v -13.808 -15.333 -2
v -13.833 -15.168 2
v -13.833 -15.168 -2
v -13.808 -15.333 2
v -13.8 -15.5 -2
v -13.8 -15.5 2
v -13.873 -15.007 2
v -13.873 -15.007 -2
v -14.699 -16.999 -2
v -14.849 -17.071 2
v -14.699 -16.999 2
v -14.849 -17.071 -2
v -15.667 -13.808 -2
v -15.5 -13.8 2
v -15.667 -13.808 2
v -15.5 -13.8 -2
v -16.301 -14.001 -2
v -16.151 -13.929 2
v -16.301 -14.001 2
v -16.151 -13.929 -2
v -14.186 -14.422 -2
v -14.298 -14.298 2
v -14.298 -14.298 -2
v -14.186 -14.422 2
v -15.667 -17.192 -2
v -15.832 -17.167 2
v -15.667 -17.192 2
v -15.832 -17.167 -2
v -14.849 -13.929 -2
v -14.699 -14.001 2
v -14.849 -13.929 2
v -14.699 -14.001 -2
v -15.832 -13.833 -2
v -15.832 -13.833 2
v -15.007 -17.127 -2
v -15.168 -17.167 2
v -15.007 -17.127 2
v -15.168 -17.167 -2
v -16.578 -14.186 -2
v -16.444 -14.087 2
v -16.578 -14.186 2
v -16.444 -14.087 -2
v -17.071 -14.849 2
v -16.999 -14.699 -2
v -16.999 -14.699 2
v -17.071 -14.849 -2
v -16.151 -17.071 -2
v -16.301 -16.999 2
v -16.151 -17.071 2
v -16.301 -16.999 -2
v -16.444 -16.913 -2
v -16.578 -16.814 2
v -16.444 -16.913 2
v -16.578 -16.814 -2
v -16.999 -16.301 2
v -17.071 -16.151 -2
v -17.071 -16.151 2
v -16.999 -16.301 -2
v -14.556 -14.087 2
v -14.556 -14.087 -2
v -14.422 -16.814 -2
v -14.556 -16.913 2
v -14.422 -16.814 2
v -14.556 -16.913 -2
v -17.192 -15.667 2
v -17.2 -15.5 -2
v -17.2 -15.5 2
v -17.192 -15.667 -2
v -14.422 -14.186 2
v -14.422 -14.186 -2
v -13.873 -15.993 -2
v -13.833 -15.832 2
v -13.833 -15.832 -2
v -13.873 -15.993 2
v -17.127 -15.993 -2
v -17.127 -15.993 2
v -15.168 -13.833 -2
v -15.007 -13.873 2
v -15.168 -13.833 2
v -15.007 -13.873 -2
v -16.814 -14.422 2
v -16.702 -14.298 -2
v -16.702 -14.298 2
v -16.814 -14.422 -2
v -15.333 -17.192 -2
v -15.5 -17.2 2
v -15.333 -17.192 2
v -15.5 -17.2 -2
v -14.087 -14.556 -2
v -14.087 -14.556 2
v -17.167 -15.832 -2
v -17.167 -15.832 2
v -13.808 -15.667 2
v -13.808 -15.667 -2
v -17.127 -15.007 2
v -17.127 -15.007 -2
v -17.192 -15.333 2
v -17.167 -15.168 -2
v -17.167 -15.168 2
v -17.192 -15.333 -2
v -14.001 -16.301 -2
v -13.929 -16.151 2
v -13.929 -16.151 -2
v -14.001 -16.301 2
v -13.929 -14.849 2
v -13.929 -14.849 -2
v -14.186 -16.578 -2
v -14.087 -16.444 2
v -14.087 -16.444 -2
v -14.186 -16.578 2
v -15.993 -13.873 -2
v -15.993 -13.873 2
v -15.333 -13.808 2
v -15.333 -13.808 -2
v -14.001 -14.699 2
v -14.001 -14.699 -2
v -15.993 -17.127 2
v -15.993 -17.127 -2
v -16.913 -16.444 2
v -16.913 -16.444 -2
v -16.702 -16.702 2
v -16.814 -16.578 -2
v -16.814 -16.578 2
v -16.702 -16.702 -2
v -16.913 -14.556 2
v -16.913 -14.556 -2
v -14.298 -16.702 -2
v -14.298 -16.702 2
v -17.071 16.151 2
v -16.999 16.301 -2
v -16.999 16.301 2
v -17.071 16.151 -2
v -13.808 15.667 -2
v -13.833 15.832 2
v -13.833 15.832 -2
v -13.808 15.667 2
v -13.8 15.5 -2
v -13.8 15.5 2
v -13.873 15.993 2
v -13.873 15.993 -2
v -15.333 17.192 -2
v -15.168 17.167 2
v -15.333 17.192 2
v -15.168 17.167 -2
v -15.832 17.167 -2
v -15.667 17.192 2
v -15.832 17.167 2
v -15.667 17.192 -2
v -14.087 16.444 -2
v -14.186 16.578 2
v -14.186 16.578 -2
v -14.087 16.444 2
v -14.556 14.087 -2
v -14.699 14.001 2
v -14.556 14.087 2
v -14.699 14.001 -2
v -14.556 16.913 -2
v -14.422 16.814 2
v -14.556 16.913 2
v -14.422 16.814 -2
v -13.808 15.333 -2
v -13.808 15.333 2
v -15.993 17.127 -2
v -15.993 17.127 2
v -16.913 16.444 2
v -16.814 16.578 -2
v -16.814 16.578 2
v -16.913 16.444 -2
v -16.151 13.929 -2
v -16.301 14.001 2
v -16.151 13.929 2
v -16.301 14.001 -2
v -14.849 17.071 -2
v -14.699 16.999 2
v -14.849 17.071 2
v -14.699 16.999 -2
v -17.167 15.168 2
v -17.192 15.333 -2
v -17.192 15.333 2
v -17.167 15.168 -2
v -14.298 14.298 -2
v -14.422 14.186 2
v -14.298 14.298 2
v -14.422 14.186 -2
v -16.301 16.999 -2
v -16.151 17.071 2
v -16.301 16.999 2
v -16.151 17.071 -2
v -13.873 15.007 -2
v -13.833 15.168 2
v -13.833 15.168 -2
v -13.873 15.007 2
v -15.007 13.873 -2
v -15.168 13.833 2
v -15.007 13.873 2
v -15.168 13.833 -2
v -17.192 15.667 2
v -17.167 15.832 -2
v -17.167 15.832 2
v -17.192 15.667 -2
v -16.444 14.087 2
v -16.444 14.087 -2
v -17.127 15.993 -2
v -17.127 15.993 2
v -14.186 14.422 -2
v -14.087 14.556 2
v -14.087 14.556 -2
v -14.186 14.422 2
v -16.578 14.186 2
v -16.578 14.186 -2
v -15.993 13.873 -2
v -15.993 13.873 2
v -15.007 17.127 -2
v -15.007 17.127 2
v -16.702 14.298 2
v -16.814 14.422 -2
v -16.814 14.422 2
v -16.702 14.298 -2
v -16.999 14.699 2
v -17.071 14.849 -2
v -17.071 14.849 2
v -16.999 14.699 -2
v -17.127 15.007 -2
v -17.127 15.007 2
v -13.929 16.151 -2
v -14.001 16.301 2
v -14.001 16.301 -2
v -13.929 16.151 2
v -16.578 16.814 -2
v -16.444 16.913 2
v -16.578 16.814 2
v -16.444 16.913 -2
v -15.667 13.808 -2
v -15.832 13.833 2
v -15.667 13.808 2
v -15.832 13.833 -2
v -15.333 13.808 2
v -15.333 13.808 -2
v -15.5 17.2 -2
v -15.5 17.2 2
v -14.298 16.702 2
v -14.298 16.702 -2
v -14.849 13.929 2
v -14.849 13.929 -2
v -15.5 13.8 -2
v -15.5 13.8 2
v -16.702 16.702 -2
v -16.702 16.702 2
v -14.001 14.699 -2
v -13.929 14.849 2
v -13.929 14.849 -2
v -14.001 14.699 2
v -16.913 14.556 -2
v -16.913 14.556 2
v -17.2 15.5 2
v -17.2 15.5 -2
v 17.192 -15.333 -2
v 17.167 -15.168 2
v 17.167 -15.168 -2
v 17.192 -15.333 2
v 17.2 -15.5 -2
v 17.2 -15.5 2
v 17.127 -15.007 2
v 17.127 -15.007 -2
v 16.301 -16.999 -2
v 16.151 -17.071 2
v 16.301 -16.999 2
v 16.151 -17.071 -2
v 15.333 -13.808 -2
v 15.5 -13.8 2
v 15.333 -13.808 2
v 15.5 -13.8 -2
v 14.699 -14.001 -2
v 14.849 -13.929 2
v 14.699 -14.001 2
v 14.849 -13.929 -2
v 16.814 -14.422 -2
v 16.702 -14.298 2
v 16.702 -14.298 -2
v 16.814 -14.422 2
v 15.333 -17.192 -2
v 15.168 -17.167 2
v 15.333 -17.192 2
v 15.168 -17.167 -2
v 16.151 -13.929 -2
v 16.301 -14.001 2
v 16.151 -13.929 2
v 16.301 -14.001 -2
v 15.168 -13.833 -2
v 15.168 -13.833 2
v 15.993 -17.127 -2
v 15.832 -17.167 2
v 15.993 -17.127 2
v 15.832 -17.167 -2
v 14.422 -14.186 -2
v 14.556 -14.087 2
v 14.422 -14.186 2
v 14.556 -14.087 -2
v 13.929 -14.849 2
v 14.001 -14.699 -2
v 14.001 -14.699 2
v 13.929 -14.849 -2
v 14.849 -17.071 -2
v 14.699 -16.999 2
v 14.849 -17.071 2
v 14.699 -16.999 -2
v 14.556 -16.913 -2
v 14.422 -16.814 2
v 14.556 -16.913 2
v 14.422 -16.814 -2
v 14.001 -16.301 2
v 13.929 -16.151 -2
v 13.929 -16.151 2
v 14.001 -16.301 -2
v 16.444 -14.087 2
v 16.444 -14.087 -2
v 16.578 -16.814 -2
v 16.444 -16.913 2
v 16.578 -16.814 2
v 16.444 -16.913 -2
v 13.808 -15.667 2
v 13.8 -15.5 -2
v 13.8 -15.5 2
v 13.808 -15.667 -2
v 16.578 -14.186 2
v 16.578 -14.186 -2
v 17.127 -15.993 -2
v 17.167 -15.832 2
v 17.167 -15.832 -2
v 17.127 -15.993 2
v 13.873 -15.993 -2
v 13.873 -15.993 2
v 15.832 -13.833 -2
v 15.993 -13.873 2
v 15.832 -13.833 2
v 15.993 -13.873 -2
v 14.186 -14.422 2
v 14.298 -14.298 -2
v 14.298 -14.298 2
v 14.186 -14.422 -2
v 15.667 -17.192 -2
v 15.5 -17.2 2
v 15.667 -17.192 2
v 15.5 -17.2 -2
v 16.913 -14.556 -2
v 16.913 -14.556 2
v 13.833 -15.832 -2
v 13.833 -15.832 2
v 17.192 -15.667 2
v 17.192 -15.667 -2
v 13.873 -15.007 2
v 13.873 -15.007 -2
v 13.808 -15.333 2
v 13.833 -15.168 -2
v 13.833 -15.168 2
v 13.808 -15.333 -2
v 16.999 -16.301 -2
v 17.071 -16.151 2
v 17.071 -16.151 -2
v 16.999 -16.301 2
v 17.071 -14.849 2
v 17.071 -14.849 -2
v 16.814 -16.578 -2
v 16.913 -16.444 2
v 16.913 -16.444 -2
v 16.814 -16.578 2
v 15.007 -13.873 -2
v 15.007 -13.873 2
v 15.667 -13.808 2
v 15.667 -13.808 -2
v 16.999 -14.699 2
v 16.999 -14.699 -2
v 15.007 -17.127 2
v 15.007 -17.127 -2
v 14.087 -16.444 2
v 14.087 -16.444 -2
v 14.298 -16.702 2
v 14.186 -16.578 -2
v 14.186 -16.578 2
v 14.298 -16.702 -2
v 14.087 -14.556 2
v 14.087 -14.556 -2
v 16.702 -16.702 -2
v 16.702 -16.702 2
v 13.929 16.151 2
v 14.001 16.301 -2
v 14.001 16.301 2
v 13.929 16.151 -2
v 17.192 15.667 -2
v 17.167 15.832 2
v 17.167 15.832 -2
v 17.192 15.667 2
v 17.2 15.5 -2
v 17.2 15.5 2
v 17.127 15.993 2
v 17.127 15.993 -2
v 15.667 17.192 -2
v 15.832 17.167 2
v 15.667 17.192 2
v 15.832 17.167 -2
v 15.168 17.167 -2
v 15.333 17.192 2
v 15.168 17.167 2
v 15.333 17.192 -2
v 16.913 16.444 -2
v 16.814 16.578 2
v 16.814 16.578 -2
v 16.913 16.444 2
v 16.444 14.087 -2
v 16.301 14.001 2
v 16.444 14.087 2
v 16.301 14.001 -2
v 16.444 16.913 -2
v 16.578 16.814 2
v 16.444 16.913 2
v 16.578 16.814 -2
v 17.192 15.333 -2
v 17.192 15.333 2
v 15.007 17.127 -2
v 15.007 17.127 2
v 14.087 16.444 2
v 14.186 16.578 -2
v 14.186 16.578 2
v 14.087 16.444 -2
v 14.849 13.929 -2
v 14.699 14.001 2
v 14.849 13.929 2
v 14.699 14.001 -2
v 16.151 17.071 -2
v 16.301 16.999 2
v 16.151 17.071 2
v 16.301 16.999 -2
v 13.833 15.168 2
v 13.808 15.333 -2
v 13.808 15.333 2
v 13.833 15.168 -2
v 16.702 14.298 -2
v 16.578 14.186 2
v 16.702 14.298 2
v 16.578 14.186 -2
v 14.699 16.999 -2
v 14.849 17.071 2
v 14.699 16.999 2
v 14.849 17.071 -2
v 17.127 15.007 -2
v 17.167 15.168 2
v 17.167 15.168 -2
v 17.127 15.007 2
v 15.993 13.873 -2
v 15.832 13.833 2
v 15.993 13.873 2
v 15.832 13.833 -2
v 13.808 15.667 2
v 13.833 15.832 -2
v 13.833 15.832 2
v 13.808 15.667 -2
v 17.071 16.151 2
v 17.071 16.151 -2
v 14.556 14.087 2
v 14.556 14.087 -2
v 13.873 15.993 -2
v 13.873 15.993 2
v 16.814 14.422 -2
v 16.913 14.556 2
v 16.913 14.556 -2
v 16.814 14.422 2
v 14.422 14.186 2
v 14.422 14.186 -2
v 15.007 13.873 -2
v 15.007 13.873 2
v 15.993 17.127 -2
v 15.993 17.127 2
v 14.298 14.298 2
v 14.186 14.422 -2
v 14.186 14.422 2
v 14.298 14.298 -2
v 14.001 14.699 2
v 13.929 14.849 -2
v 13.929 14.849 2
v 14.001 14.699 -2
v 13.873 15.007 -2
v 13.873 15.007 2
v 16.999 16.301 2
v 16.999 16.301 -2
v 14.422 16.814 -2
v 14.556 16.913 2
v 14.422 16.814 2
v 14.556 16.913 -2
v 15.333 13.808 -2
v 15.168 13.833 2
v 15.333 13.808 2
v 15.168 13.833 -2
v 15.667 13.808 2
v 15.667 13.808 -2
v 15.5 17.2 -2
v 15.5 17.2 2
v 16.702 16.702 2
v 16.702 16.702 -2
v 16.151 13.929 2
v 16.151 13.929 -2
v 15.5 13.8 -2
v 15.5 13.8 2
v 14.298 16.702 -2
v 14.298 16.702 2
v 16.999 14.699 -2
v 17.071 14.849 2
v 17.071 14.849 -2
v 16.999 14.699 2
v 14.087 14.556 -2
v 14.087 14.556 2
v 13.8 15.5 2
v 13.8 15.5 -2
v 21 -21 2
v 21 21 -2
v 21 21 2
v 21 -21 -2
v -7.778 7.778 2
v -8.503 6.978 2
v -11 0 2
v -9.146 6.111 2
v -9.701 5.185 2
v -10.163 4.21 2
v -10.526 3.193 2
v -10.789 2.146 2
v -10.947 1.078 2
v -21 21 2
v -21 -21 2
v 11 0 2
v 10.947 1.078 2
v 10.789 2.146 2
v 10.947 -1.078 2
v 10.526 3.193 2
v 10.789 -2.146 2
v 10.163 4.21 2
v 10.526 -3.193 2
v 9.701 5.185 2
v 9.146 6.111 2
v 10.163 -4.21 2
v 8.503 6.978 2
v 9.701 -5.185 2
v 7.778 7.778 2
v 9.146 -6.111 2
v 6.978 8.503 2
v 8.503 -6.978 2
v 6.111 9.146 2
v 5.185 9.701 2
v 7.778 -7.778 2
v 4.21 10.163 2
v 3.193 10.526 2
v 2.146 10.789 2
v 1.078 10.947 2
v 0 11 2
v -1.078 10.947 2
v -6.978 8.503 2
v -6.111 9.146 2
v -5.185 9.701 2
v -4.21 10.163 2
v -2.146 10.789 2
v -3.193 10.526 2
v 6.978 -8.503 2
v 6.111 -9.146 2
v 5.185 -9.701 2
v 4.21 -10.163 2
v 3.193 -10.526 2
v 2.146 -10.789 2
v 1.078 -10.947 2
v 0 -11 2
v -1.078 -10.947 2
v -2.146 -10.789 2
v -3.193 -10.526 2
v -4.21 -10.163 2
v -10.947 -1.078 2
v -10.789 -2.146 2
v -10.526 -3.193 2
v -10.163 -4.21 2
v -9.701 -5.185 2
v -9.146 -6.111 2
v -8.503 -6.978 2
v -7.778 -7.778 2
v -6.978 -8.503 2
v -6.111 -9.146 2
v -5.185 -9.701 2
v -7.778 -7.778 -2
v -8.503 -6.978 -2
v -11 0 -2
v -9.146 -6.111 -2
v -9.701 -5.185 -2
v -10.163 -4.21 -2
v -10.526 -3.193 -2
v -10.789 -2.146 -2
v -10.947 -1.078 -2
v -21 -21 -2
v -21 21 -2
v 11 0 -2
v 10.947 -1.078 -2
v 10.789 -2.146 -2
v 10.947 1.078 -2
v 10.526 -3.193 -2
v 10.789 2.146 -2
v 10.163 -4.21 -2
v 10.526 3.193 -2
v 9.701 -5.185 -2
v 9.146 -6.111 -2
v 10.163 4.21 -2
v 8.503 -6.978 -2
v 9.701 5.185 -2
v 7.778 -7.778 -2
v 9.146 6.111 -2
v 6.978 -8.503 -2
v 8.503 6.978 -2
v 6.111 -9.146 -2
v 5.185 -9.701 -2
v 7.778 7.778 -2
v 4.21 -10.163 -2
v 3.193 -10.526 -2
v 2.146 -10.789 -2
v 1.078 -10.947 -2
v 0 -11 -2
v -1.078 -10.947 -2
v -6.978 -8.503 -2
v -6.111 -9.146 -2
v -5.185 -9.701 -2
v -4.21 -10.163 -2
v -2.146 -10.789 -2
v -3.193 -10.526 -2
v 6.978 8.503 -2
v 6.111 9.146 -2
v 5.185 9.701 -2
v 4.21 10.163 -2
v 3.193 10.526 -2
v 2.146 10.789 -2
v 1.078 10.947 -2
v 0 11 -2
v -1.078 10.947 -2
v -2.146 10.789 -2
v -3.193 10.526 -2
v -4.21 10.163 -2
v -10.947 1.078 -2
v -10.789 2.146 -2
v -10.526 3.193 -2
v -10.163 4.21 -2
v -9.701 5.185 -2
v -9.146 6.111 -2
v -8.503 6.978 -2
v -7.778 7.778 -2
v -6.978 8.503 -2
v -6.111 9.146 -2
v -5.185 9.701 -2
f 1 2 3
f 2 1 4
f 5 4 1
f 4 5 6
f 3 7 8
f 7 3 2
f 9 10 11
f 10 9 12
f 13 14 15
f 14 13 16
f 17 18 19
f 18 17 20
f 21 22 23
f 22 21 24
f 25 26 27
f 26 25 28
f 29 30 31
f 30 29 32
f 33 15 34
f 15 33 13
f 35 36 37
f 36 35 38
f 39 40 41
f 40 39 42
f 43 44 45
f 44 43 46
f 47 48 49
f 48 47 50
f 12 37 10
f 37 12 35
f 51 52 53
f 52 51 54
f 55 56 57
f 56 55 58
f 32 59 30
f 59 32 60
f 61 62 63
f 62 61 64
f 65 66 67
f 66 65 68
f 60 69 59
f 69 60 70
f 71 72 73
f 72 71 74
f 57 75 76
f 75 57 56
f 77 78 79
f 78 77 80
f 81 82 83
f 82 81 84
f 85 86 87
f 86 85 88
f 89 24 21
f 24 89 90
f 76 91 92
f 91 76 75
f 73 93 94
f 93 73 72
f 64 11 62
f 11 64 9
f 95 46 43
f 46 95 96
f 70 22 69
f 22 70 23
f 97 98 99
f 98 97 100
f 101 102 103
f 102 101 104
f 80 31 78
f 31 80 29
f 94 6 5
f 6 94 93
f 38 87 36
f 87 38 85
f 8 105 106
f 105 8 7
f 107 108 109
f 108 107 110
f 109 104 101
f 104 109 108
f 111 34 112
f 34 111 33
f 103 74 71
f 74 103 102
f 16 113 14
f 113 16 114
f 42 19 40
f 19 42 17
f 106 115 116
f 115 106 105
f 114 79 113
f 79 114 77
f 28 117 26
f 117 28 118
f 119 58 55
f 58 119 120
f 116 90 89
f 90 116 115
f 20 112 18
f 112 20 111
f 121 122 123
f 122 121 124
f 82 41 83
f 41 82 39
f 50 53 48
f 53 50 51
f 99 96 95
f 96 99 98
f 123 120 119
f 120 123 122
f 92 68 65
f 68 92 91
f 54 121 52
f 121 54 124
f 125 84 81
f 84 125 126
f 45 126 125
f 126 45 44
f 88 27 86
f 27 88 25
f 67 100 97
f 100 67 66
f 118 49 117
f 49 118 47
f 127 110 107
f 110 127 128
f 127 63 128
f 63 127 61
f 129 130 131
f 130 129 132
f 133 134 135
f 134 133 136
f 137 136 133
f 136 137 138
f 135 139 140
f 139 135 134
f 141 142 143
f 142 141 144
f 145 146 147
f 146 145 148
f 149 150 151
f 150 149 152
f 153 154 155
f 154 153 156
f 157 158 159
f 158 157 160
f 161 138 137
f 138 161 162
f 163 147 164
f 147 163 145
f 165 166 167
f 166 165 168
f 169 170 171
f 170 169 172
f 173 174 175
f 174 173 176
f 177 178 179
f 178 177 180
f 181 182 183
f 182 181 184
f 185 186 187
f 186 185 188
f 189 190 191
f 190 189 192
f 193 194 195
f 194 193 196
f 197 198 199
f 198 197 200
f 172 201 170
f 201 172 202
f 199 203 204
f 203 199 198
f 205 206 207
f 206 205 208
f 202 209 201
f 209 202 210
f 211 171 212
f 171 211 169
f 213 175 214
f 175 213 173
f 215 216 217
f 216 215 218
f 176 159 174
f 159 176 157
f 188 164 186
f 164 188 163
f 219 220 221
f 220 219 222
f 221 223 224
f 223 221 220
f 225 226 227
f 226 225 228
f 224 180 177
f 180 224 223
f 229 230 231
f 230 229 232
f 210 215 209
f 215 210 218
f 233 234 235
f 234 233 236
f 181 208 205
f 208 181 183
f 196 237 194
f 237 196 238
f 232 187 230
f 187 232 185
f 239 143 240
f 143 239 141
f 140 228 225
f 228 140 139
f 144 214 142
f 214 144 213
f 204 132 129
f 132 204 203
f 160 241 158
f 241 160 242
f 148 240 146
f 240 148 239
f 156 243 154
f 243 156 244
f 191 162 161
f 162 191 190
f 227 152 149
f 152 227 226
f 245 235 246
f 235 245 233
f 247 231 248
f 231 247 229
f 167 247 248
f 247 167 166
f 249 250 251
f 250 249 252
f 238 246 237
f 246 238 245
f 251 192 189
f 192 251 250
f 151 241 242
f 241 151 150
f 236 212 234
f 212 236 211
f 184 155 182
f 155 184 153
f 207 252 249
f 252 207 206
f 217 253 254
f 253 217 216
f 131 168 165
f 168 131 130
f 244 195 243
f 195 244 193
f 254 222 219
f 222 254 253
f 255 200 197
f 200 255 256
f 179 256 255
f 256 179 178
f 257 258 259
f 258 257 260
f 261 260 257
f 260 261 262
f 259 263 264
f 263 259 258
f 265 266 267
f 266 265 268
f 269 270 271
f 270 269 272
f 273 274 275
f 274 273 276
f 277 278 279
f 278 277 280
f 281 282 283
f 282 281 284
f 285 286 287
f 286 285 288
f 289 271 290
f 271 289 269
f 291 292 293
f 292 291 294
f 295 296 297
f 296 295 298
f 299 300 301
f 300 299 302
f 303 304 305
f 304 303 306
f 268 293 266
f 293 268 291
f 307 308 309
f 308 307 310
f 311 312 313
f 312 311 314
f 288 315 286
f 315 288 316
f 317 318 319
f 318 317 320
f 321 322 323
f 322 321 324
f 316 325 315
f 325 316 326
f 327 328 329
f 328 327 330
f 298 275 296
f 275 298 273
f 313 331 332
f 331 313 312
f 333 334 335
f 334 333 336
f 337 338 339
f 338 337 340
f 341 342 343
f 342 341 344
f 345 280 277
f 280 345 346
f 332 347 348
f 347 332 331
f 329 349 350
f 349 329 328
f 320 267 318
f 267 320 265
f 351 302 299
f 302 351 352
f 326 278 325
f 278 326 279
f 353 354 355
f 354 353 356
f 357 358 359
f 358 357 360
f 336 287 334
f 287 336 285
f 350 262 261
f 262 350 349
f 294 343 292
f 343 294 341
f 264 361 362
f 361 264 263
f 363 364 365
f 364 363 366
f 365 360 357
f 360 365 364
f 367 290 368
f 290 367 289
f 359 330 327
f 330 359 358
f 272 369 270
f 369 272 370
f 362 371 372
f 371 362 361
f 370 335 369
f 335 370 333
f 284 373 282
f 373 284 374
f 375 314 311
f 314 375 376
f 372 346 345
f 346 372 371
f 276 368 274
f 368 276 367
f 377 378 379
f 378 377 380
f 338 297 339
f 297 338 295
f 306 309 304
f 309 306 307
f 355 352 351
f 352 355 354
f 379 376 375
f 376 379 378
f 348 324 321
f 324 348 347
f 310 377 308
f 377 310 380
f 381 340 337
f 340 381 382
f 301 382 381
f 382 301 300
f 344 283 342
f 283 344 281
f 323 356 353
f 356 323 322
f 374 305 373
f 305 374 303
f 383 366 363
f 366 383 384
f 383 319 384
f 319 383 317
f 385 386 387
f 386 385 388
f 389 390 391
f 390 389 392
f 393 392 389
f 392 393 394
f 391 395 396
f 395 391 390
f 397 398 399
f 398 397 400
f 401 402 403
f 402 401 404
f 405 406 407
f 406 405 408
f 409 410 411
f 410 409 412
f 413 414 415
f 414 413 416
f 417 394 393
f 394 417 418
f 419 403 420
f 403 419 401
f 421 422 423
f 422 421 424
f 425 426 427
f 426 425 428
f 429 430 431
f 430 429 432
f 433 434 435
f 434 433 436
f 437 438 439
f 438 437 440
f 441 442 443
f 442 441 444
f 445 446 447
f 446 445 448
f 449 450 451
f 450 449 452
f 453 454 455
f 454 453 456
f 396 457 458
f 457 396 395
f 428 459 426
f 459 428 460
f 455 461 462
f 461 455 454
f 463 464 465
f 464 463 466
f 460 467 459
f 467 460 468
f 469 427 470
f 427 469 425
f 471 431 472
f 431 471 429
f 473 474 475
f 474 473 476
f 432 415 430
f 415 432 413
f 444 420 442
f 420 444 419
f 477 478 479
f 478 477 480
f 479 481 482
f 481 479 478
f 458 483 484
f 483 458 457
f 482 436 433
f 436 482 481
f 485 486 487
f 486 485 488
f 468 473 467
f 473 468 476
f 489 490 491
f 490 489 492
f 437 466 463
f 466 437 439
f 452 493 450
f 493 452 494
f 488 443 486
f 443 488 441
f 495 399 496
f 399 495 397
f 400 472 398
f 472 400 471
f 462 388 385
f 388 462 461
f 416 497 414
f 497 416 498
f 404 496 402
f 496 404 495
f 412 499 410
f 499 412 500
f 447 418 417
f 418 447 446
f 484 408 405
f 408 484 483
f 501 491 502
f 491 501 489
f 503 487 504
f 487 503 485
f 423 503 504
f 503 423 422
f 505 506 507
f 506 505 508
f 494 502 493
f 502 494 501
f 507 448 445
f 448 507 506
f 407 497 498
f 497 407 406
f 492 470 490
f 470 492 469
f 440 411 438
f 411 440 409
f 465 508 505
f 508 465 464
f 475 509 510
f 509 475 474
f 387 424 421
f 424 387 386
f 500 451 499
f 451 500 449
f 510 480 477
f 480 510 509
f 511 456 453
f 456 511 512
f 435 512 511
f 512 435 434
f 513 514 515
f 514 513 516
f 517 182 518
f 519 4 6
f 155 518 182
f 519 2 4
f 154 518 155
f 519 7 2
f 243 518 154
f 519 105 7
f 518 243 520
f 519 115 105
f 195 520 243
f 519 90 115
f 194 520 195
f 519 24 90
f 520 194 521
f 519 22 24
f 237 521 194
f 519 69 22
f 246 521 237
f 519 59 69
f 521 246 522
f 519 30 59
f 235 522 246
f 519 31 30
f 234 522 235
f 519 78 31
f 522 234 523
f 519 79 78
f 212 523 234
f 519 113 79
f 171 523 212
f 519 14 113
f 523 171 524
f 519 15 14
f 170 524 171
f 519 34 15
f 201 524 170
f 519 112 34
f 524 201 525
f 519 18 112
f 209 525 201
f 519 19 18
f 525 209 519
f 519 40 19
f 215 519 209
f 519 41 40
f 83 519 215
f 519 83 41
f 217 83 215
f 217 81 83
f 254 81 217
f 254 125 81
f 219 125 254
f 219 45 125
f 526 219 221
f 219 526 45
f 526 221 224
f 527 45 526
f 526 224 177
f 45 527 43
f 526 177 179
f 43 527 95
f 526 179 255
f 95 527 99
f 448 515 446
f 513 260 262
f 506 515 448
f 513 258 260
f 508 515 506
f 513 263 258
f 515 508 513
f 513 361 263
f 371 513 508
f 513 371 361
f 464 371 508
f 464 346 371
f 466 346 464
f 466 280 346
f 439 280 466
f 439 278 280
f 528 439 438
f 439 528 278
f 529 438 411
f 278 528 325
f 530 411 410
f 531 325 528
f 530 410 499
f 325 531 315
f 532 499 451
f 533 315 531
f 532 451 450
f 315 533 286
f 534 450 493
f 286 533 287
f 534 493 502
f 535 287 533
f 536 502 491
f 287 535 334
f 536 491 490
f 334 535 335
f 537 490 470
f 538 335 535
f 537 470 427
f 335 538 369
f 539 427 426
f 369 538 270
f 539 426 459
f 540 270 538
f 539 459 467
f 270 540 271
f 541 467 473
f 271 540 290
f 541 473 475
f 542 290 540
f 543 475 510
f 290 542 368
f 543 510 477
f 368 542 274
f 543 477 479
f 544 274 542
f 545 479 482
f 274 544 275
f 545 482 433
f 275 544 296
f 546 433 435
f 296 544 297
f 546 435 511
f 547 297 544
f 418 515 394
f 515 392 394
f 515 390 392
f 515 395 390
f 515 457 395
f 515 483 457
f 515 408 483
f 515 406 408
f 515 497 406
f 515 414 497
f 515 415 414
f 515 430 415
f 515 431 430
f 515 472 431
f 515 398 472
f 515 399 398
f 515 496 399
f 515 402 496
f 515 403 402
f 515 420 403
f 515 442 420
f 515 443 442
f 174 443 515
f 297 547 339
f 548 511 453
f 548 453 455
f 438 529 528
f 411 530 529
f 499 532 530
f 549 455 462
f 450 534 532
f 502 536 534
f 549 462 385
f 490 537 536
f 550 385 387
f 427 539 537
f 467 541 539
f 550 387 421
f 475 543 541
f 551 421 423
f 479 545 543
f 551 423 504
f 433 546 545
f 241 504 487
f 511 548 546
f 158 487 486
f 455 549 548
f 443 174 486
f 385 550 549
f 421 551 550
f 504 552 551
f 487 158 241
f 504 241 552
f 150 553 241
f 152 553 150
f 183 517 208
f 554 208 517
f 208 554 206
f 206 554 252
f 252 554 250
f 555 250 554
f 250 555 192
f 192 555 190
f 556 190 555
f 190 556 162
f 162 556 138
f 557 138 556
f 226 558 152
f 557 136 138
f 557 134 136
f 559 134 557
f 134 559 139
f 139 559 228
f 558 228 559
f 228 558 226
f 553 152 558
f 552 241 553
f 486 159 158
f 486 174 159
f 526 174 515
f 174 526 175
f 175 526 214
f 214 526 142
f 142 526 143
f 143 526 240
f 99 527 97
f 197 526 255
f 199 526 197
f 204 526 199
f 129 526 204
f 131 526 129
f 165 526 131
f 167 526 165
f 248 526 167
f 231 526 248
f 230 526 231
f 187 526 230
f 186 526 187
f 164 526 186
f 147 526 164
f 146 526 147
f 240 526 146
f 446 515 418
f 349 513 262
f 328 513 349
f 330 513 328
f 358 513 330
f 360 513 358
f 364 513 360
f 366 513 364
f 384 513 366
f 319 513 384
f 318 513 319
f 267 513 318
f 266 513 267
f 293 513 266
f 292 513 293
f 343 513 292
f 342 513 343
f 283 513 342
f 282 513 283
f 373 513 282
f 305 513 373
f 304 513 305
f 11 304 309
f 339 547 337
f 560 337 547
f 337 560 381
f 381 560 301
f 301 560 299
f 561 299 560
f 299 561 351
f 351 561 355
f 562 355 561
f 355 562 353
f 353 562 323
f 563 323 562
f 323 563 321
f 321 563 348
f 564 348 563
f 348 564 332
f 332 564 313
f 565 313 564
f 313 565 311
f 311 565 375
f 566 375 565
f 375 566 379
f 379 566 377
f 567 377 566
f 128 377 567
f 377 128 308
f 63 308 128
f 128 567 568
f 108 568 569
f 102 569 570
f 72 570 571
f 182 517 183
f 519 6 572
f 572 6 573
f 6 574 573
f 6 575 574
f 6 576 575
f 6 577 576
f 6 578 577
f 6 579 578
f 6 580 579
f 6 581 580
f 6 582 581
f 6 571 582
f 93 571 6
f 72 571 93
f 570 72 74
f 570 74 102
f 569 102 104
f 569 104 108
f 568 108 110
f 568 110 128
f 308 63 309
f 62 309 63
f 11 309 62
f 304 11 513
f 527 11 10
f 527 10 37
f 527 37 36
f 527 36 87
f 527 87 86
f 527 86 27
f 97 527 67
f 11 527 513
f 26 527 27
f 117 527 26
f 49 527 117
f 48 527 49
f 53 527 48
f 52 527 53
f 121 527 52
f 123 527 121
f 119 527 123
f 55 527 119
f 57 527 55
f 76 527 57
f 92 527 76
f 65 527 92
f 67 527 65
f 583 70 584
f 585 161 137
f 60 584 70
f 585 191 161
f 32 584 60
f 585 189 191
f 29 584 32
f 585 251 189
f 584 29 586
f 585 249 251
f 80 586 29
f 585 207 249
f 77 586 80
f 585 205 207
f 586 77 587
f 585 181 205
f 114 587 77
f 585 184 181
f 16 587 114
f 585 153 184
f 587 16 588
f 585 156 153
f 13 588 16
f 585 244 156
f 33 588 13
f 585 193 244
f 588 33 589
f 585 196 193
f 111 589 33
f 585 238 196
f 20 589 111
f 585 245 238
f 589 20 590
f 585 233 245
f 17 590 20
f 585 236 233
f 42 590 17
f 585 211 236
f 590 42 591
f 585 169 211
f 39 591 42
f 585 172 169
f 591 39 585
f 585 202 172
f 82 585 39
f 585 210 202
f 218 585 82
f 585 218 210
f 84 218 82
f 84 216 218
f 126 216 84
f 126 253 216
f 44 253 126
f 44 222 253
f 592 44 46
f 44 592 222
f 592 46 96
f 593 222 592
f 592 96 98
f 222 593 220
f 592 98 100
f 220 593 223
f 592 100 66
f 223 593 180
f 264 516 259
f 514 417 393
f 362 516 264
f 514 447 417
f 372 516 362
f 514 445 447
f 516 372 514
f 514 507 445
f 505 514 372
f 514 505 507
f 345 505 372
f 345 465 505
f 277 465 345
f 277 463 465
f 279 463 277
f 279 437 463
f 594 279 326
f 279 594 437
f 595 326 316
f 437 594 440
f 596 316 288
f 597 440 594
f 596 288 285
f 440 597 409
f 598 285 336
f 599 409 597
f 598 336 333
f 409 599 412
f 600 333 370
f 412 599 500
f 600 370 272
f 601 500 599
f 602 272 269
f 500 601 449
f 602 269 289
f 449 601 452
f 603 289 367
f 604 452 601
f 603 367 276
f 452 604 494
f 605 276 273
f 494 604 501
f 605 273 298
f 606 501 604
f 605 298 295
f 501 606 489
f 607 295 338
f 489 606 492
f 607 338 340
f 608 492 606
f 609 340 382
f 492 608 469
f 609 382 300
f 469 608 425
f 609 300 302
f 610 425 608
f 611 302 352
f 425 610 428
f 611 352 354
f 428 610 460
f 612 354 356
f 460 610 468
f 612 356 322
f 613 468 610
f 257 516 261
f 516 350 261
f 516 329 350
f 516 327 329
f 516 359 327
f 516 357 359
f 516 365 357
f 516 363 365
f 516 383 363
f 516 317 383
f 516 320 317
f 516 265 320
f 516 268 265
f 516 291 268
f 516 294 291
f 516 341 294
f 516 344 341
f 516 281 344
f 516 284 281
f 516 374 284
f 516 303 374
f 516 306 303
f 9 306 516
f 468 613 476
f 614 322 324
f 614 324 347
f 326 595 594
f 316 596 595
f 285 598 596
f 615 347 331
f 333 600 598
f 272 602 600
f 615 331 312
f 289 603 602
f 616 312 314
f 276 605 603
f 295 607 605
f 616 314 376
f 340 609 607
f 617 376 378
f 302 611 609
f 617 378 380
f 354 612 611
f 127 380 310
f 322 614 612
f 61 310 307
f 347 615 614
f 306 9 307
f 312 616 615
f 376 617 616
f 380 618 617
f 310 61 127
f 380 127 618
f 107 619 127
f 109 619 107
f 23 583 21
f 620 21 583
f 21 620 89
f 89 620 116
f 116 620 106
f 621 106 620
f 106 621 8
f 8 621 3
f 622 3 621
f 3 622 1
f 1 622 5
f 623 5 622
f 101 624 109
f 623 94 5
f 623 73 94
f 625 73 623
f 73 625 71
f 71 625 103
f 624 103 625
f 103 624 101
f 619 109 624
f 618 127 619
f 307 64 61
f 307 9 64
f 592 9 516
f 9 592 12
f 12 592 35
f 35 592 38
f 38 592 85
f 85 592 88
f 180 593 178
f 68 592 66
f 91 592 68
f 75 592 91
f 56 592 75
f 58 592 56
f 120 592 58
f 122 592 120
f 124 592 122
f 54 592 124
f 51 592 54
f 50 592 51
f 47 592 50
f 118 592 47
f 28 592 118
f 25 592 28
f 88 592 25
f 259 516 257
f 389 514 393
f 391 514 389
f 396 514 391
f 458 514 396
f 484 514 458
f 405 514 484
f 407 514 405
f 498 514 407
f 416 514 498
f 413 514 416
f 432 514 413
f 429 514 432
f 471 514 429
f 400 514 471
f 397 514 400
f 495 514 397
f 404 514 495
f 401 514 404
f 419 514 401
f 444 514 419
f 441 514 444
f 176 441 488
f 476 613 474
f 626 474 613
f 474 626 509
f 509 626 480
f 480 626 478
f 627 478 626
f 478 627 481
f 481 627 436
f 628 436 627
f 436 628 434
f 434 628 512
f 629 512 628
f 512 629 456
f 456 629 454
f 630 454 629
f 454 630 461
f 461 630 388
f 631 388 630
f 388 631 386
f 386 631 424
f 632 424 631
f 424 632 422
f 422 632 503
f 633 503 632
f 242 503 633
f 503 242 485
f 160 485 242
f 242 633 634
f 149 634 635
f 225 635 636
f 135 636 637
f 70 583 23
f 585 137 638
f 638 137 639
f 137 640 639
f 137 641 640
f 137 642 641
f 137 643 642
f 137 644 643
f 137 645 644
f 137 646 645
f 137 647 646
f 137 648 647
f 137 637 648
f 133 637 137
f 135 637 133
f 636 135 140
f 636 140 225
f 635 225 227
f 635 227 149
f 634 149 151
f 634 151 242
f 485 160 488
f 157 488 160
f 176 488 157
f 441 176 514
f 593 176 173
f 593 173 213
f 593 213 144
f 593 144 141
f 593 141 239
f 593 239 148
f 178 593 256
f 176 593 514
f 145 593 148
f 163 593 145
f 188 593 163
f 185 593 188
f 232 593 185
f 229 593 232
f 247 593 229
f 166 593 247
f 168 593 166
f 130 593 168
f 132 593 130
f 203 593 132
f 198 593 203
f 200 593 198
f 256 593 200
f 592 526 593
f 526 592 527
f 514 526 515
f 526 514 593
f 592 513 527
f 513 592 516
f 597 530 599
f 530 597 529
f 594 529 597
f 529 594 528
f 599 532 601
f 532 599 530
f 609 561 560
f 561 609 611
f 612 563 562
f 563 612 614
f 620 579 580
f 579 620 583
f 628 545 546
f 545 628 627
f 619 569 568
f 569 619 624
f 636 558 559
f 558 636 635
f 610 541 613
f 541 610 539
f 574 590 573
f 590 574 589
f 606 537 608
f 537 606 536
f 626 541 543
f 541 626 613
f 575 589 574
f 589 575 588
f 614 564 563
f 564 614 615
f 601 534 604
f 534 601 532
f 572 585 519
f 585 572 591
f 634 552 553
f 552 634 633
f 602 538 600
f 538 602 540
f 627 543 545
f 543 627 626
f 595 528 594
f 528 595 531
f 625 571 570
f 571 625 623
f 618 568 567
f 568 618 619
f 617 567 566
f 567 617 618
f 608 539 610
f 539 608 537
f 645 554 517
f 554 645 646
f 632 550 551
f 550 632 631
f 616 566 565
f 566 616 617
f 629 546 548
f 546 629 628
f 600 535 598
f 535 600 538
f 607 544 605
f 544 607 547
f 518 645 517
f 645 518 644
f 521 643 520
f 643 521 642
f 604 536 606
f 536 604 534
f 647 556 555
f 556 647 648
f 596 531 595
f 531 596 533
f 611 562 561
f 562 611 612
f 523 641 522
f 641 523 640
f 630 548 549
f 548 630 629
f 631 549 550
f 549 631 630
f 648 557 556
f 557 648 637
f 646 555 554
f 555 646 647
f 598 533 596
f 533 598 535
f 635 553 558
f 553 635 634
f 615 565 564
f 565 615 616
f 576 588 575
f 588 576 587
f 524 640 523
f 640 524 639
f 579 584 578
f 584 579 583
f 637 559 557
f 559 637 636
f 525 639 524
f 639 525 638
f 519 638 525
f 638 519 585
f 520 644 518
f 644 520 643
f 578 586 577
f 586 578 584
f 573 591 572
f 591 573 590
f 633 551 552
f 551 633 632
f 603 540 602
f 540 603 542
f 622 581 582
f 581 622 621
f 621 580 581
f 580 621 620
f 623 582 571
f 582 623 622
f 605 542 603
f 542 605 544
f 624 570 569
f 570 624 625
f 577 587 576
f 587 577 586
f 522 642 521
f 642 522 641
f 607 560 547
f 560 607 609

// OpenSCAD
$fn=64;

plate_size = 42;
plate_thickness = 4;

hole_pattern = 31;          // center-to-center
mount_hole_d = 3.4;         // clearance for M3
center_bore_d = 22;

difference() {
    cube([plate_size, plate_size, plate_thickness], center=true);

    // Center bore
    cylinder(h=plate_thickness + 2, d=center_bore_d, center=true);

    // Four mounting holes (31mm square pattern)
    for (x = [-hole_pattern/2, hole_pattern/2])
        for (y = [-hole_pattern/2, hole_pattern/2])
            translate([x, y, 0])
                cylinder(h=plate_thickness + 2, d=mount_hole_d, center=true);
}
